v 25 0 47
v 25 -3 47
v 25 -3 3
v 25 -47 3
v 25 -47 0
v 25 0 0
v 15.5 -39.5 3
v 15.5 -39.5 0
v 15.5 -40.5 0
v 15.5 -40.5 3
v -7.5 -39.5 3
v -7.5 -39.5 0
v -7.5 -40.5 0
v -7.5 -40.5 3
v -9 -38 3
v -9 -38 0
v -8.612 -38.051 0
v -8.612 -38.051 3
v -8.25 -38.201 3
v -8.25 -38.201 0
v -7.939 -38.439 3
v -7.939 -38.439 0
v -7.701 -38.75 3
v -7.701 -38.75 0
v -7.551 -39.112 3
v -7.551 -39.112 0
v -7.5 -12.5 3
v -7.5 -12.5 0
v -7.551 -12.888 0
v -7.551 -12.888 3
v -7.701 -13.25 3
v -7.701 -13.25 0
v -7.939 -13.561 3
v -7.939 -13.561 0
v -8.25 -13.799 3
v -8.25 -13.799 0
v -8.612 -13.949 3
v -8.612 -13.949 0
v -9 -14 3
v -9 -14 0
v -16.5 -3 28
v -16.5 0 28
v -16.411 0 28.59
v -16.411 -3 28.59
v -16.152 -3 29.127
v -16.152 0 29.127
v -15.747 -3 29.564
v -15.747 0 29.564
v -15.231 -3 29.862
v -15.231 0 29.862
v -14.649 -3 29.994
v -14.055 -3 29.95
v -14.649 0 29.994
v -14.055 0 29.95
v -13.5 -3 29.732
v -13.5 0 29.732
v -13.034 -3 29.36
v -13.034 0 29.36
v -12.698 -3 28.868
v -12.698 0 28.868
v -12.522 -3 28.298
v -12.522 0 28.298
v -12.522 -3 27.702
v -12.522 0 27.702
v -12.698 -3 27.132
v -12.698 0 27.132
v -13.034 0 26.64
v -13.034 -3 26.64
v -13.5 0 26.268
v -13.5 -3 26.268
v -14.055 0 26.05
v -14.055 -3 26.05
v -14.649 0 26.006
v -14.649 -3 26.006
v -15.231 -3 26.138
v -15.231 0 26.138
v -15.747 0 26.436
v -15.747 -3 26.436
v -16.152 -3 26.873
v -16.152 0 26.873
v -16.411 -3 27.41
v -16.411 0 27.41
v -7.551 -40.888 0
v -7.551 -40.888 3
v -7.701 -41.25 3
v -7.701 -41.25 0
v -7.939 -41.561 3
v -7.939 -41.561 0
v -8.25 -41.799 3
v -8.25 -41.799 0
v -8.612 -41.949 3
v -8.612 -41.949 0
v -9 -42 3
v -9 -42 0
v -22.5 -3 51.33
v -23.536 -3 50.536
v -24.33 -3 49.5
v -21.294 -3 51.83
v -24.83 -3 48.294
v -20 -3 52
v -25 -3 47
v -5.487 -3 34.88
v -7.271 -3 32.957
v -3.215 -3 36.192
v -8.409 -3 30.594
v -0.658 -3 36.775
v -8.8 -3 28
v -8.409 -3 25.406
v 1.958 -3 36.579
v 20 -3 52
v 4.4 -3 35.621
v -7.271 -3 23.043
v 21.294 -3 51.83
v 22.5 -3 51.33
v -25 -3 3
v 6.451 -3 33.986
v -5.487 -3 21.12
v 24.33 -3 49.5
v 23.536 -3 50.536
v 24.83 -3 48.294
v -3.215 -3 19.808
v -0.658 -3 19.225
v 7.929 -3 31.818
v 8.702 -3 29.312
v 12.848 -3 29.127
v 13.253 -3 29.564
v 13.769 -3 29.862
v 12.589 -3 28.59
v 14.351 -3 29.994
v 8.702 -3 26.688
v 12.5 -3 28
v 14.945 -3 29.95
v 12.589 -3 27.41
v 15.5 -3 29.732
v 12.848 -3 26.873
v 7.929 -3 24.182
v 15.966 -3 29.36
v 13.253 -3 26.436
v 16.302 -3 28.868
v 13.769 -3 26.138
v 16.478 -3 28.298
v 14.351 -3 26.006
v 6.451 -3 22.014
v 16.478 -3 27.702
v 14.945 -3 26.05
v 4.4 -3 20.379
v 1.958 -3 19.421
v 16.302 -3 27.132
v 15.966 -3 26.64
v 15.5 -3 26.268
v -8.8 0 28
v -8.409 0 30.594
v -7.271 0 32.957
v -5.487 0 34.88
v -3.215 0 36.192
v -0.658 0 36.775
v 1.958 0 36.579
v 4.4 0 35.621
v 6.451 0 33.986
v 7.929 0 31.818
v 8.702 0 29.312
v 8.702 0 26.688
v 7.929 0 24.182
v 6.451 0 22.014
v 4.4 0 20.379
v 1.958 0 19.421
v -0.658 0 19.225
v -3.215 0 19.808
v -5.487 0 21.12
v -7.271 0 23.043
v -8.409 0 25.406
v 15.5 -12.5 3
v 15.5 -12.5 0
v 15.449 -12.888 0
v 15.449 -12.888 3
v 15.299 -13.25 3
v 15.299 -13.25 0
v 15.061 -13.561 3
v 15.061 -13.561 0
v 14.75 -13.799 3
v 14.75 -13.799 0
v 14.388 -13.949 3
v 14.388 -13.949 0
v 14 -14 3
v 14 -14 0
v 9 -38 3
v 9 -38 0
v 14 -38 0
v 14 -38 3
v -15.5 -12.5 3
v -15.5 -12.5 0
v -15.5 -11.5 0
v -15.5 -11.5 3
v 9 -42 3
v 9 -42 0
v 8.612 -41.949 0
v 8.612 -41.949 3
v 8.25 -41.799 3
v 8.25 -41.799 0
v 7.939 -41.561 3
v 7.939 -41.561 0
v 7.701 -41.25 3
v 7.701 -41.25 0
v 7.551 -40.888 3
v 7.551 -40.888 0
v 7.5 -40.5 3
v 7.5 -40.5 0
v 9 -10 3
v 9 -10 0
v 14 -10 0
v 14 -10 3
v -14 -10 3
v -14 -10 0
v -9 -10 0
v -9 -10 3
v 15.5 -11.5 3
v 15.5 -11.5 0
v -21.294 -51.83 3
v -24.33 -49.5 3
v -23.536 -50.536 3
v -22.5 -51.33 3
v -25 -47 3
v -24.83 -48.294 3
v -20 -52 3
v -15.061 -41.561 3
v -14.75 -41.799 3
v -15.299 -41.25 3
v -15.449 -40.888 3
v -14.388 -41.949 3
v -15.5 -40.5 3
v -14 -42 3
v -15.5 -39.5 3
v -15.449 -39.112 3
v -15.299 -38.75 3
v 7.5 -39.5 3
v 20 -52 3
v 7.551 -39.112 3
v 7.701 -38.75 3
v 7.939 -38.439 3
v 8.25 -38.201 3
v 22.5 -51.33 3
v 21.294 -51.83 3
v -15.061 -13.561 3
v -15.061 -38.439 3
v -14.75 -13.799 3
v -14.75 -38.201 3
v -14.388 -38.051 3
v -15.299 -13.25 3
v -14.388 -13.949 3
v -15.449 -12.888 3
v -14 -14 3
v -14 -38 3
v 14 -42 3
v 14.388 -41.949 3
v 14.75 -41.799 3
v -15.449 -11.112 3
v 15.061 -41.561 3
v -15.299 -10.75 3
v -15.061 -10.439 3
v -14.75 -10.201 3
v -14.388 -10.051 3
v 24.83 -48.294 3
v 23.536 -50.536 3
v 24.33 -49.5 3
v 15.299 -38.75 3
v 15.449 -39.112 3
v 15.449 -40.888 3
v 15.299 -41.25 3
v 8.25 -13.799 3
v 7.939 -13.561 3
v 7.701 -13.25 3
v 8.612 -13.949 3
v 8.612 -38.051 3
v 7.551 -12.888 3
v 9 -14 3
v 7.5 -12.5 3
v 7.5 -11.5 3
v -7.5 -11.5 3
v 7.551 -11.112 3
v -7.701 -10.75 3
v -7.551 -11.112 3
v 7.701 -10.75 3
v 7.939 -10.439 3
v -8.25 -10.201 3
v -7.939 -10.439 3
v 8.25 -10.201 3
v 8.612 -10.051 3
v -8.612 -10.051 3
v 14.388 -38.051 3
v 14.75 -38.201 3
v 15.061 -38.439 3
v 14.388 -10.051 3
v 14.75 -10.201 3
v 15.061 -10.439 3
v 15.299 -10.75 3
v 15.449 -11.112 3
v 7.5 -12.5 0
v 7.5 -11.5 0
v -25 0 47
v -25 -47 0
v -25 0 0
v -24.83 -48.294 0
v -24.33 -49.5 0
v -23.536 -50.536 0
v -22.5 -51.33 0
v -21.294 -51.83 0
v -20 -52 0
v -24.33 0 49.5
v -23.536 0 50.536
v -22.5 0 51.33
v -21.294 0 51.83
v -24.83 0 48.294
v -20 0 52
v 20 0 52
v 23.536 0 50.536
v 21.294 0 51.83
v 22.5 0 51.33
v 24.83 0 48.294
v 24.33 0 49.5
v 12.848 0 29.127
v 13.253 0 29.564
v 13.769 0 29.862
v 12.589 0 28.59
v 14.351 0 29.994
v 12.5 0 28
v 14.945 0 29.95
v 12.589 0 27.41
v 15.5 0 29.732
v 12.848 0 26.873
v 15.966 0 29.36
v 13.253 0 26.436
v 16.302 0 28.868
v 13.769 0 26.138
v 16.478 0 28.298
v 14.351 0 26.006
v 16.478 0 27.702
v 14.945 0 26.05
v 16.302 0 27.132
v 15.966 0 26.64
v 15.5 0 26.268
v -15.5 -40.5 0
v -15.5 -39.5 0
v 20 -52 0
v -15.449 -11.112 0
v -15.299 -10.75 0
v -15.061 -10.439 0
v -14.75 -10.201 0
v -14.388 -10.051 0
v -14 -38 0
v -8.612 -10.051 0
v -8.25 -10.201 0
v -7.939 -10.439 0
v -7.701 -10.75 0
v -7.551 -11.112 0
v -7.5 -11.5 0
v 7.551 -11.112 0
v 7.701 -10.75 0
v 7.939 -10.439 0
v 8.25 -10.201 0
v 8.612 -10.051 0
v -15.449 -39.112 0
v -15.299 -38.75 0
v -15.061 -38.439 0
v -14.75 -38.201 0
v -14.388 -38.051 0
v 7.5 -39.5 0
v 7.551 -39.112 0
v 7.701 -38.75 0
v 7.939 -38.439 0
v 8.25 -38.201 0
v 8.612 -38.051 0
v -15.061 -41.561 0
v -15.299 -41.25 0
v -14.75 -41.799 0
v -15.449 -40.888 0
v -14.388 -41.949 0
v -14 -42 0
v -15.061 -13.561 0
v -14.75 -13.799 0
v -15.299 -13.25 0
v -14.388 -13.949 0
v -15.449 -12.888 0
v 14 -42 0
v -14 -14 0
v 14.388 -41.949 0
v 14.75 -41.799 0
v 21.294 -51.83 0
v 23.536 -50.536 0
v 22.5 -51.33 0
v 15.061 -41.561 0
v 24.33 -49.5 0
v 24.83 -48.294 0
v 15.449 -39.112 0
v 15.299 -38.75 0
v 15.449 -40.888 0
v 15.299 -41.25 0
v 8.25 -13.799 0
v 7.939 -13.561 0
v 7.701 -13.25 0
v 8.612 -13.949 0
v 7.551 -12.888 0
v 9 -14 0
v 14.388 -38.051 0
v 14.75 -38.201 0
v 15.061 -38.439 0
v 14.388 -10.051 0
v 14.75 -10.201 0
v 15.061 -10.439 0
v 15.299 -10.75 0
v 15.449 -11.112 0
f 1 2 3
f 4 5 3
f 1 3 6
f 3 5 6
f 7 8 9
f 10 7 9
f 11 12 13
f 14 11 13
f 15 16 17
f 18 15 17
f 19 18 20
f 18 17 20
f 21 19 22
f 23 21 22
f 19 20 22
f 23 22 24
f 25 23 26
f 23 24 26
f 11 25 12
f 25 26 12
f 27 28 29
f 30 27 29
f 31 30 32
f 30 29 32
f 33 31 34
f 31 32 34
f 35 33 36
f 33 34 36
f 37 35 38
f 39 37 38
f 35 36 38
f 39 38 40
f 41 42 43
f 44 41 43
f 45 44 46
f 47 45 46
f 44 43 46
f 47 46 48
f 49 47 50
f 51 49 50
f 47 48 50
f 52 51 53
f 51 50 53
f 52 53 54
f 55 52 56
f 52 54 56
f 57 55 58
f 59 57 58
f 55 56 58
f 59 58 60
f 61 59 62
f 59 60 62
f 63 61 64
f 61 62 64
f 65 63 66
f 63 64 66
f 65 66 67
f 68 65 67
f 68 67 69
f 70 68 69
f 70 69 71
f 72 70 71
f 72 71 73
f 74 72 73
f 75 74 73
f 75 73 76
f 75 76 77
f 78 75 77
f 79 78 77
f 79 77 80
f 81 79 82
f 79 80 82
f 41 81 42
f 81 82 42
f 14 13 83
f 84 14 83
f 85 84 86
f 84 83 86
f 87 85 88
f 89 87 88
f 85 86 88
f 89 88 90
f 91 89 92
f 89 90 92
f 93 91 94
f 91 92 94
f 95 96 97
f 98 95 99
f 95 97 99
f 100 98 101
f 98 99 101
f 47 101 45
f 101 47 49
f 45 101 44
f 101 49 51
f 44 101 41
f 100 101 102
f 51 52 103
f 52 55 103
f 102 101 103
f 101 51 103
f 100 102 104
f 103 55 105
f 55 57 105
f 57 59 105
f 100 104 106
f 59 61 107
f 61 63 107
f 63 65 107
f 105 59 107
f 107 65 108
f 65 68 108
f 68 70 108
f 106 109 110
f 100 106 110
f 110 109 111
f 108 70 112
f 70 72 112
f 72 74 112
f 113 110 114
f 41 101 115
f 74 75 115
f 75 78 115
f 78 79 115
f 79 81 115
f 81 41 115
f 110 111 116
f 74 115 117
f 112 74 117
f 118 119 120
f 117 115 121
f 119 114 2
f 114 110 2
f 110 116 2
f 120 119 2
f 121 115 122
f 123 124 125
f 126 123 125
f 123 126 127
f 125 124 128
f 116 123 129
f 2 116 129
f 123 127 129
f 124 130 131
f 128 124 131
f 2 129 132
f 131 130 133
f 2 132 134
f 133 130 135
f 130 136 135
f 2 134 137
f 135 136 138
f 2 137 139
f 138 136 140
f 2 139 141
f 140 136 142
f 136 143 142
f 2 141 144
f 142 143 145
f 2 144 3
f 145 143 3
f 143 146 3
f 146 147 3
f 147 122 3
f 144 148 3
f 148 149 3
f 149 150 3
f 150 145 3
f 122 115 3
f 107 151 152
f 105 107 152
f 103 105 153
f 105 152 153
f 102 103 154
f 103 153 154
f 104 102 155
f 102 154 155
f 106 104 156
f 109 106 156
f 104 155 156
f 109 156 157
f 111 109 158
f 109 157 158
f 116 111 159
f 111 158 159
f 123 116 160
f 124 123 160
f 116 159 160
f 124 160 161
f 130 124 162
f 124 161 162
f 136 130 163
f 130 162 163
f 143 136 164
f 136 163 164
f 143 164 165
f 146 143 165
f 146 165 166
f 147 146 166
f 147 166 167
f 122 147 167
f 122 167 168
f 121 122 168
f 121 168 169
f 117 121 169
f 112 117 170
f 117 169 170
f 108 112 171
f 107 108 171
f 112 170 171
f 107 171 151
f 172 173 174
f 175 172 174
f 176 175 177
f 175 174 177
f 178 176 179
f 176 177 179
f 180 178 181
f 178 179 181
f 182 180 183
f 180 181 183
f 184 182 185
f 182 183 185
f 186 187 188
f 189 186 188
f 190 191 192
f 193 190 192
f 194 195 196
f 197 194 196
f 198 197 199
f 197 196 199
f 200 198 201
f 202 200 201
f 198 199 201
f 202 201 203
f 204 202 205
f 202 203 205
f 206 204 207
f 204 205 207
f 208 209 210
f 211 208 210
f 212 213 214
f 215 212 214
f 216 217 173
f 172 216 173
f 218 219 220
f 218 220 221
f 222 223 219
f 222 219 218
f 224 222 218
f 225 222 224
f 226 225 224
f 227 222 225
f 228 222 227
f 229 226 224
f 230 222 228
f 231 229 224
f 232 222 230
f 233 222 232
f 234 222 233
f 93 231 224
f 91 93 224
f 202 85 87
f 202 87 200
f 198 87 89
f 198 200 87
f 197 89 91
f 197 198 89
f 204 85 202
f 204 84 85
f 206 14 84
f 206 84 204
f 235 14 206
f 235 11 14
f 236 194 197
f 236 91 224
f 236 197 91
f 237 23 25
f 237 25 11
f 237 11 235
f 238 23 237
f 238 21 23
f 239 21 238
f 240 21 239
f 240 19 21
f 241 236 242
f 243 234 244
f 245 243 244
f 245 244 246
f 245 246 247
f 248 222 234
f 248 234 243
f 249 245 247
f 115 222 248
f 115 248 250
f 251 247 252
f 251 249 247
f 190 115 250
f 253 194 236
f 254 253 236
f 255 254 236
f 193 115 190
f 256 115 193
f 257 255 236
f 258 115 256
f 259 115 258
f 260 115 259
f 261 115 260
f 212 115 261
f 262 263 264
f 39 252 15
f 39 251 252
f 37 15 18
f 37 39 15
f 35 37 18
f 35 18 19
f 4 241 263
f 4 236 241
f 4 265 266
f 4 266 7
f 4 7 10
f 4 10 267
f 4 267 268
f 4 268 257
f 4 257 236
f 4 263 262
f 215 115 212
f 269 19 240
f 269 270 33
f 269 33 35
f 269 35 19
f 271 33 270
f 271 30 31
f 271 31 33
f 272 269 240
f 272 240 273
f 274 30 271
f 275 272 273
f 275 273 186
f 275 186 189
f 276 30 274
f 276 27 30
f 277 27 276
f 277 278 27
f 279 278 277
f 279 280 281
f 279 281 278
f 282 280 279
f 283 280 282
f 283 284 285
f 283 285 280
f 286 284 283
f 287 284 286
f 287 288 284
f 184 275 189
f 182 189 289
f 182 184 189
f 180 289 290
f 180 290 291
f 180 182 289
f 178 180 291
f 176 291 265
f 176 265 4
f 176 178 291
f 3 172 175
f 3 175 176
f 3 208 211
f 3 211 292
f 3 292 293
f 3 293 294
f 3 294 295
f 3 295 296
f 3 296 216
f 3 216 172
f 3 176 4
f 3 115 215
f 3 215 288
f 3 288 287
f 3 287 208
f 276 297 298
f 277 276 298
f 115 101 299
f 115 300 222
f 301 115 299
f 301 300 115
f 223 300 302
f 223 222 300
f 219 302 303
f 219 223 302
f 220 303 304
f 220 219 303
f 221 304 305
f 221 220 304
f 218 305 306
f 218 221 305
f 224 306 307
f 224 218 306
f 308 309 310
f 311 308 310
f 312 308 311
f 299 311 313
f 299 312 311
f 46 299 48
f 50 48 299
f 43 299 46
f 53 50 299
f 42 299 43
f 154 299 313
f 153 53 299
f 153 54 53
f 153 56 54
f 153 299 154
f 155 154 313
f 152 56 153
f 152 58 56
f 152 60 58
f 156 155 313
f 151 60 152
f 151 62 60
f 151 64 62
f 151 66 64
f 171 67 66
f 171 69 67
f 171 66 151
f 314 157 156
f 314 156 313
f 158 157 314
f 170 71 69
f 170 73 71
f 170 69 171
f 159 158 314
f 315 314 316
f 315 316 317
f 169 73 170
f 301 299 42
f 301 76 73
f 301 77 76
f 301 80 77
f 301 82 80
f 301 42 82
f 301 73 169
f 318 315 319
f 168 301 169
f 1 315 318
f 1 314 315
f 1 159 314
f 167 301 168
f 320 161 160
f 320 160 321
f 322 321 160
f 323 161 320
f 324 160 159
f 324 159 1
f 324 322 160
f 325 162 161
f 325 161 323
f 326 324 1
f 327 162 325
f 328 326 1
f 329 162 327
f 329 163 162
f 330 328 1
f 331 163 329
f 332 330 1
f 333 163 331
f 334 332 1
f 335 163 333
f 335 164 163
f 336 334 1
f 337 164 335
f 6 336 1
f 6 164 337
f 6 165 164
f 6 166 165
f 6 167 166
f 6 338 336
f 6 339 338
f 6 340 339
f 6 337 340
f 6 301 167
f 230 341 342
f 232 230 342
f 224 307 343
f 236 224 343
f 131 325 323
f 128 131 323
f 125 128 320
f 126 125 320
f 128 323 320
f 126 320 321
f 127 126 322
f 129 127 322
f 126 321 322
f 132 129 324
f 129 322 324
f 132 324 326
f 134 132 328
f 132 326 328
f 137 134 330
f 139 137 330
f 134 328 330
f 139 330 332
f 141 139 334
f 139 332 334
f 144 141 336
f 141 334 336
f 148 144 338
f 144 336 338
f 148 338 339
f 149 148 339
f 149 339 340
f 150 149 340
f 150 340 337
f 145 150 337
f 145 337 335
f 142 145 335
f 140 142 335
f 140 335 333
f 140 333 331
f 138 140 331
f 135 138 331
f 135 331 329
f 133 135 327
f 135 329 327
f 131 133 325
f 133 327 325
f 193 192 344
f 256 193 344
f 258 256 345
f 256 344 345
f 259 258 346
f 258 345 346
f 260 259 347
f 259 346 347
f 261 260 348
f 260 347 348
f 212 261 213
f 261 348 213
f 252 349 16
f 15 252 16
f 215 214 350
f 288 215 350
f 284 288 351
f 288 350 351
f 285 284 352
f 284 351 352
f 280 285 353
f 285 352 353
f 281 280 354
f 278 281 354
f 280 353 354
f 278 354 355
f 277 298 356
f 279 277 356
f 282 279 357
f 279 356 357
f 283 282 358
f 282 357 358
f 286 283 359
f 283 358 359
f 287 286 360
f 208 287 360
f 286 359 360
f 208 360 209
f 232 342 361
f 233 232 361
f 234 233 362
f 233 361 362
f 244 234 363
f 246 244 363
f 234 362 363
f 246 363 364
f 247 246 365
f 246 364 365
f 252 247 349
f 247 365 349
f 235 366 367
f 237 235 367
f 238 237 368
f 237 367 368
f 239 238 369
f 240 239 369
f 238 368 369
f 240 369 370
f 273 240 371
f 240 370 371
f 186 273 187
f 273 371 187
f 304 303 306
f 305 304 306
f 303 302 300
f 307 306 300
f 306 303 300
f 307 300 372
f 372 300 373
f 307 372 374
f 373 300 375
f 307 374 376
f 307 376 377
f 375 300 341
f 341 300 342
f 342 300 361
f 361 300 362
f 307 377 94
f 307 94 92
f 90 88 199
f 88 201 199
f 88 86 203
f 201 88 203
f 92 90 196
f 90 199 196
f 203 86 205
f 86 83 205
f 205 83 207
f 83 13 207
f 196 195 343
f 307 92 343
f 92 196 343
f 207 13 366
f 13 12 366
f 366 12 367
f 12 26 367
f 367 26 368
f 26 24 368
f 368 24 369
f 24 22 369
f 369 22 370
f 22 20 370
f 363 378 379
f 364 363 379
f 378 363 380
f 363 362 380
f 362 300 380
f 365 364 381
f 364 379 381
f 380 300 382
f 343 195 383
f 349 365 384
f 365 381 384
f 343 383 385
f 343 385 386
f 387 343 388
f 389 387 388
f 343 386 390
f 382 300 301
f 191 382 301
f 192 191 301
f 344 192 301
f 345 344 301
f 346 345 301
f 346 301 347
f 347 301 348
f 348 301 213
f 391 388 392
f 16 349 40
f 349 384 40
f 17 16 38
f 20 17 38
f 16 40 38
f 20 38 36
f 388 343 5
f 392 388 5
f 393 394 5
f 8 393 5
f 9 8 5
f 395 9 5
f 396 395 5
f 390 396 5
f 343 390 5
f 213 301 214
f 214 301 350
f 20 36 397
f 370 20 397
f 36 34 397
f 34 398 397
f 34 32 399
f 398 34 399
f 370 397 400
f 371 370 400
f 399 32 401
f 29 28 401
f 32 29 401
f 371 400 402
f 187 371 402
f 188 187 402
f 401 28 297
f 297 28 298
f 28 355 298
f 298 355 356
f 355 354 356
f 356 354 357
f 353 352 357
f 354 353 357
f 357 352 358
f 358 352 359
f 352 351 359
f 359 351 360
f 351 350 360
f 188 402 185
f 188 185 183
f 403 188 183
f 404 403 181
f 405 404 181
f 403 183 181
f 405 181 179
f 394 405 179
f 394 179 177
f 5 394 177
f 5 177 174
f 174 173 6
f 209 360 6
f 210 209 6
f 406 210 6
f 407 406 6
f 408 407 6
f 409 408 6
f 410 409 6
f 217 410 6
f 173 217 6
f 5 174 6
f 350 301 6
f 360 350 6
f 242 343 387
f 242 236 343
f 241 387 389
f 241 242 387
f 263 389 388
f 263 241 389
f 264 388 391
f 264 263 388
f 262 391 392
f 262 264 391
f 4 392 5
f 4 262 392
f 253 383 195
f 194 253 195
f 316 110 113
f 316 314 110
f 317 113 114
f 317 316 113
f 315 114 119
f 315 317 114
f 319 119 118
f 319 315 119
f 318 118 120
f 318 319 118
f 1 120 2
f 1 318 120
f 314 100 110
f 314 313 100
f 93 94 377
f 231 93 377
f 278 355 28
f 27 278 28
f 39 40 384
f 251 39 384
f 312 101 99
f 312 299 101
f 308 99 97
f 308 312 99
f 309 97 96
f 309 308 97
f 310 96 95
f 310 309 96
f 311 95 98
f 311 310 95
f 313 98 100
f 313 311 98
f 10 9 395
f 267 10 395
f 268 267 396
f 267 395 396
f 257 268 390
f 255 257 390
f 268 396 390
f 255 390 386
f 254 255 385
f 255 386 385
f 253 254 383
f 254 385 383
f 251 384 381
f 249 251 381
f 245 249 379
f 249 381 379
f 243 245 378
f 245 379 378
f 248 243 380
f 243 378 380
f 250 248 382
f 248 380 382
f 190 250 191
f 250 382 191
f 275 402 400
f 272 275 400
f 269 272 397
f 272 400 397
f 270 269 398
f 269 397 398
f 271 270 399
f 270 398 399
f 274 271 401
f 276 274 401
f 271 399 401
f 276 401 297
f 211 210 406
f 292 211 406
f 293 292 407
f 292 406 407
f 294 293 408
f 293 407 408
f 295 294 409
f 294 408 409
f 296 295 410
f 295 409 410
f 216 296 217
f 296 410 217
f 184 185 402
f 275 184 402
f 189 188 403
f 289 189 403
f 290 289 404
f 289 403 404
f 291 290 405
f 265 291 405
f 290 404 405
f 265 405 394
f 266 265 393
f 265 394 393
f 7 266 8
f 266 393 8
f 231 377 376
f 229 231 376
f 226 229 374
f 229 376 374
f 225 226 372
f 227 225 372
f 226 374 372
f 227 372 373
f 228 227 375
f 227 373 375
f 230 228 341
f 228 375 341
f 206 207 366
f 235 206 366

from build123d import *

# Parameters (mm, degrees)
F0_W     = 50
F0_H     = 26
F1_DEPTH = 3
F2_W     = 50
F2_H     = 3
F3_DEPTH = 49
F4_R     = 2
F4_R_2   = 8.8
F5_DEPTH = 3
F6_R     = 5


with BuildPart() as f1:
    # F0 (on Top) → F1 (new body)
    with BuildSketch(Plane.XY):
        Polygon((25, 0), (0, 0), (-25, 0), (-25, -26), (25, -26), align=None)
        with BuildLine():
            ThreePointArc((-7.5, -12.5), (-7.93934, -13.56066), (-9, -14))
            Line((-9, -14), (-14, -14))
            ThreePointArc((-14, -14), (-15.06066, -13.56066), (-15.5, -12.5))
            Line((-15.5, -12.5), (-15.5, -11.5))
            ThreePointArc((-15.5, -11.5), (-15.06066, -10.43934), (-14, -10))
            Line((-14, -10), (-9, -10))
            ThreePointArc((-9, -10), (-7.93934, -10.43934), (-7.5, -11.5))
            Line((-7.5, -11.5), (-7.5, -12.5))
        make_face(mode=Mode.SUBTRACT)
        with BuildLine():
            Line((14, -14), (9, -14))
            ThreePointArc((9, -14), (7.93934, -13.56066), (7.5, -12.5))
            Line((7.5, -12.5), (7.5, -11.5))
            ThreePointArc((7.5, -11.5), (7.93934, -10.43934), (9, -10))
            Line((9, -10), (14, -10))
            ThreePointArc((14, -10), (15.06066, -10.43934), (15.5, -11.5))
            Line((15.5, -11.5), (15.5, -12.5))
            ThreePointArc((15.5, -12.5), (15.06066, -13.56066), (14, -14))
        make_face(mode=Mode.SUBTRACT)
        with Locations((0, -39)):
            Rectangle(F0_W, F0_H)
        with BuildLine():
            ThreePointArc((-7.5, -40.5), (-7.93934, -41.56066), (-9, -42))
            Line((-9, -42), (-14, -42))
            ThreePointArc((-14, -42), (-15.06066, -41.56066), (-15.5, -40.5))
            Line((-15.5, -40.5), (-15.5, -39.5))
            ThreePointArc((-15.5, -39.5), (-15.06066, -38.43934), (-14, -38))
            Line((-14, -38), (-9, -38))
            ThreePointArc((-9, -38), (-7.93934, -38.43934), (-7.5, -39.5))
            Line((-7.5, -39.5), (-7.5, -40.5))
        make_face(mode=Mode.SUBTRACT)
        with BuildLine():
            Line((15.5, -39.5), (15.5, -40.5))
            ThreePointArc((15.5, -40.5), (15.06066, -41.56066), (14, -42))
            Line((14, -42), (9, -42))
            ThreePointArc((9, -42), (7.93934, -41.56066), (7.5, -40.5))
            Line((7.5, -40.5), (7.5, -39.5))
            ThreePointArc((7.5, -39.5), (7.93934, -38.43934), (9, -38))
            Line((9, -38), (14, -38))
            ThreePointArc((14, -38), (15.06066, -38.43934), (15.5, -39.5))
        make_face(mode=Mode.SUBTRACT)
    extrude(amount=F1_DEPTH)

    # F2 (on face) → F3 (join)
    with BuildSketch(Plane.XY.offset(3)):
        with Locations((0, -1.5)):
            Rectangle(F2_W, F2_H)
    extrude(amount=F3_DEPTH)

    # F4 (on face) → F5 (cut)
    with BuildSketch(Plane(origin=(0, 0, 0), x_dir=(-1, 0, 0), z_dir=(0, 1, 0))):
        with Locations((-14.5, 28)):
            Circle(F4_R)
        with Locations((0, 28)):
            Circle(F4_R_2)
        with Locations((14.5, 28)):
            Circle(F4_R)
    extrude(amount=-F5_DEPTH, mode=Mode.SUBTRACT)

    # F6
    f6_edges = [f1.edges().sort_by_distance(p)[0] for p in [
        (-25, -1.5, 52),
        (25, -1.5, 52),
        (-25, -52, 1.5),
        (25, -52, 1.5),
    ]]
    fillet(f6_edges, radius=F6_R)


solid = f1.part
